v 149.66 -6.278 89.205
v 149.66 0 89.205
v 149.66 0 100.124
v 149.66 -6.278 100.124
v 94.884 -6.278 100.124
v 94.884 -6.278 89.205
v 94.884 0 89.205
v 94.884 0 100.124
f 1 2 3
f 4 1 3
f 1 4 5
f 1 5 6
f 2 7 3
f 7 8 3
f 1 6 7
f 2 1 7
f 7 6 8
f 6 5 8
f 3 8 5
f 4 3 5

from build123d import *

# Parameters (mm, degrees)
F0_W     = 60.157597065
F0_H     = 193.3636292815
F1_DEPTH = 25.4
F2_W     = 95.6334322691
F2_H     = 193.3636292815
F3_DEPTH = 346.1655080318
F4_W     = 36.0463038087
F4_H     = 45.3125461936
F4_H_2   = 28.3587574959
F4_H_3   = 42.0287176967
F4_H_4   = 40.5834168196
F5_DEPTH = 25.4
F6_W     = 173.7615093589
F6_H     = 156.2834382057
F7_DEPTH = 25.4
F8_W     = 111.7356568575
F8_H     = 18.2048454881
F8_W_2   = 24.7079984665
F8_H_2   = 0.1422166824
F8_H_3   = 10.7772573829
F8_W_3   = 37.4475419521
F9_DEPTH = 3015.5396461487


with BuildPart() as f1:
    # F0 (on Front) → F1 (new body)
    with BuildSketch(Plane.XZ):
        Polygon((0, -95.5383777618), (0, 0), (0, 97.8252515197), (-34.4947949052, 97.8252515197), (-34.4947949052, -95.5383777618), align=None)
        Polygon((-34.4947949052, 97.8252515197), (0, 97.8252515197), (16.5538433939, 97.8252515197), (16.5538433939, 130.5804550648), (-34.4947949052, 130.5804550648), (-34.4947949052, 120.8282783628), align=None)
        Polygon((16.5538433939, -95.5383777618), (0, -95.5383777618), (-34.4947949052, -95.5383777618), (-34.4947949052, -108.2416400313), (16.5538433939, -108.2416400313), (16.5538433939, -98.9981219172), align=None)
        Polygon((95.6334322691, 97.8252515197), (95.6334322691, 0), (95.6334322691, -95.5383777618), (16.5538433939, -95.5383777618), (16.5538433939, -98.9981219172), (149.6599912643, -98.9981219172), (149.6599912643, 130.5804550648), (16.5538433939, 130.5804550648), (16.5538433939, 97.8252515197), align=None)
        with Locations((-64.5735934377, 1.1434368789)):
            Rectangle(F0_W, F0_H)
        Polygon((-94.6523919702, 97.8252515197), (-34.4947949052, 97.8252515197), (-34.4947949052, 120.8282783628), (-151.3080298901, 120.8282783628), (-151.3080298901, -95.5383777618), (-94.6523919702, -95.5383777618), align=None)
    extrude(amount=F1_DEPTH)

    # F2 (on face) → F3 (join)
    with BuildSketch(Plane(origin=(0, 0, 0), x_dir=(-1, 0, 0), z_dir=(0, 1, 0))):
        Polygon((151.3080298901, 108.881868422), (-95.6334322691, 108.881868422), (-95.6334322691, 97.8252515197), (0, 97.8252515197), (0, -95.5383777618), (-95.6334322691, -95.5383777618), (-95.6334322691, -98.9981219172), (-16.5538433939, -98.9981219172), (-16.5538433939, -108.2416400313), (34.4947949052, -108.2416400313), (34.4947949052, -95.5383777618), (151.3080298901, -95.5383777618), align=None)
        with Locations((-47.8167161345, 1.1434368789)):
            Rectangle(F2_W, F2_H)
    extrude(amount=-F3_DEPTH)

    # F4 (on face) → F5 (join)
    with BuildSketch(Plane(origin=(0, 0, 0), x_dir=(-1, 0, 0), z_dir=(0, 1, 0))):
        Polygon((78.8774639368, 89.2047658563), (-77.3589983582, 89.2047658563), (-77.3589983582, 43.8922196627), (-77.3589983582, 15.5334621668), (-77.3589983582, -26.4952555299), (-77.3589983582, -67.0786723495), (78.8774639368, -67.0786723495), align=None)
        with Locations((-95.3821502626, 66.5484927595)):
            Rectangle(F4_W, F4_H)
        with Locations((-95.3821502626, 29.7128409147)):
            Rectangle(F4_W, F4_H_2)
        with Locations((-95.3821502626, -5.4808966815)):
            Rectangle(F4_W, F4_H_3)
        with Locations((-95.3821502626, -46.7869639397)):
            Rectangle(F4_W, F4_H_4)
    extrude(amount=F5_DEPTH)

    # F6 (on face) → F7 (join)
    with BuildSketch(Plane(origin=(0, 25.4, 0), x_dir=(-1, 0, 0), z_dir=(0, 1, 0))):
        with Locations((-8.0032907426, 11.0630467534)):
            Rectangle(F6_W, F6_H)
    extrude(amount=F7_DEPTH)

    # F8 (on face) → F9 (intersect)
    with BuildSketch(Plane.YZ.offset(94.8840454221)):
        Polygon((50.8, 89.2047658563), (50.8, -67.0786723495), (74.874997139, -67.0786723495), (186.6106539965, -67.0786723495), (186.6106539965, 89.3469825387), (112.9555404186, 89.3469825387), (112.9555404186, 70.3727975488), (75.5079984665, 70.3727975488), (75.5079984665, 89.2047658563), align=None)
        with Locations((130.7428255677, -76.1810950935)):
            Rectangle(F8_W, F8_H)
        Polygon((-6.2784720212, 89.2047658563), (50.8, 89.2047658563), (50.8, 89.3469825387), (50.8, 100.1242399216), (-6.2784720212, 100.1242399216), align=None)
        with Locations((63.1539992332, 89.2758741975)):
            Rectangle(F8_W_2, F8_H_2)
        with Locations((63.1539992332, 94.7356112301)):
            Rectangle(F8_W_2, F8_H_3)
        Polygon((75.5079984665, 89.3469825387), (75.5079984665, 89.2047658563), (75.5079984665, 70.3727975488), (112.9555404186, 70.3727975488), (112.9555404186, 89.3469825387), align=None)
        with Locations((94.2317694426, 94.7356112301)):
            Rectangle(F8_W_3, F8_H_3)
    extrude(amount=F9_DEPTH, mode=Mode.INTERSECT)


solid = f1.part
